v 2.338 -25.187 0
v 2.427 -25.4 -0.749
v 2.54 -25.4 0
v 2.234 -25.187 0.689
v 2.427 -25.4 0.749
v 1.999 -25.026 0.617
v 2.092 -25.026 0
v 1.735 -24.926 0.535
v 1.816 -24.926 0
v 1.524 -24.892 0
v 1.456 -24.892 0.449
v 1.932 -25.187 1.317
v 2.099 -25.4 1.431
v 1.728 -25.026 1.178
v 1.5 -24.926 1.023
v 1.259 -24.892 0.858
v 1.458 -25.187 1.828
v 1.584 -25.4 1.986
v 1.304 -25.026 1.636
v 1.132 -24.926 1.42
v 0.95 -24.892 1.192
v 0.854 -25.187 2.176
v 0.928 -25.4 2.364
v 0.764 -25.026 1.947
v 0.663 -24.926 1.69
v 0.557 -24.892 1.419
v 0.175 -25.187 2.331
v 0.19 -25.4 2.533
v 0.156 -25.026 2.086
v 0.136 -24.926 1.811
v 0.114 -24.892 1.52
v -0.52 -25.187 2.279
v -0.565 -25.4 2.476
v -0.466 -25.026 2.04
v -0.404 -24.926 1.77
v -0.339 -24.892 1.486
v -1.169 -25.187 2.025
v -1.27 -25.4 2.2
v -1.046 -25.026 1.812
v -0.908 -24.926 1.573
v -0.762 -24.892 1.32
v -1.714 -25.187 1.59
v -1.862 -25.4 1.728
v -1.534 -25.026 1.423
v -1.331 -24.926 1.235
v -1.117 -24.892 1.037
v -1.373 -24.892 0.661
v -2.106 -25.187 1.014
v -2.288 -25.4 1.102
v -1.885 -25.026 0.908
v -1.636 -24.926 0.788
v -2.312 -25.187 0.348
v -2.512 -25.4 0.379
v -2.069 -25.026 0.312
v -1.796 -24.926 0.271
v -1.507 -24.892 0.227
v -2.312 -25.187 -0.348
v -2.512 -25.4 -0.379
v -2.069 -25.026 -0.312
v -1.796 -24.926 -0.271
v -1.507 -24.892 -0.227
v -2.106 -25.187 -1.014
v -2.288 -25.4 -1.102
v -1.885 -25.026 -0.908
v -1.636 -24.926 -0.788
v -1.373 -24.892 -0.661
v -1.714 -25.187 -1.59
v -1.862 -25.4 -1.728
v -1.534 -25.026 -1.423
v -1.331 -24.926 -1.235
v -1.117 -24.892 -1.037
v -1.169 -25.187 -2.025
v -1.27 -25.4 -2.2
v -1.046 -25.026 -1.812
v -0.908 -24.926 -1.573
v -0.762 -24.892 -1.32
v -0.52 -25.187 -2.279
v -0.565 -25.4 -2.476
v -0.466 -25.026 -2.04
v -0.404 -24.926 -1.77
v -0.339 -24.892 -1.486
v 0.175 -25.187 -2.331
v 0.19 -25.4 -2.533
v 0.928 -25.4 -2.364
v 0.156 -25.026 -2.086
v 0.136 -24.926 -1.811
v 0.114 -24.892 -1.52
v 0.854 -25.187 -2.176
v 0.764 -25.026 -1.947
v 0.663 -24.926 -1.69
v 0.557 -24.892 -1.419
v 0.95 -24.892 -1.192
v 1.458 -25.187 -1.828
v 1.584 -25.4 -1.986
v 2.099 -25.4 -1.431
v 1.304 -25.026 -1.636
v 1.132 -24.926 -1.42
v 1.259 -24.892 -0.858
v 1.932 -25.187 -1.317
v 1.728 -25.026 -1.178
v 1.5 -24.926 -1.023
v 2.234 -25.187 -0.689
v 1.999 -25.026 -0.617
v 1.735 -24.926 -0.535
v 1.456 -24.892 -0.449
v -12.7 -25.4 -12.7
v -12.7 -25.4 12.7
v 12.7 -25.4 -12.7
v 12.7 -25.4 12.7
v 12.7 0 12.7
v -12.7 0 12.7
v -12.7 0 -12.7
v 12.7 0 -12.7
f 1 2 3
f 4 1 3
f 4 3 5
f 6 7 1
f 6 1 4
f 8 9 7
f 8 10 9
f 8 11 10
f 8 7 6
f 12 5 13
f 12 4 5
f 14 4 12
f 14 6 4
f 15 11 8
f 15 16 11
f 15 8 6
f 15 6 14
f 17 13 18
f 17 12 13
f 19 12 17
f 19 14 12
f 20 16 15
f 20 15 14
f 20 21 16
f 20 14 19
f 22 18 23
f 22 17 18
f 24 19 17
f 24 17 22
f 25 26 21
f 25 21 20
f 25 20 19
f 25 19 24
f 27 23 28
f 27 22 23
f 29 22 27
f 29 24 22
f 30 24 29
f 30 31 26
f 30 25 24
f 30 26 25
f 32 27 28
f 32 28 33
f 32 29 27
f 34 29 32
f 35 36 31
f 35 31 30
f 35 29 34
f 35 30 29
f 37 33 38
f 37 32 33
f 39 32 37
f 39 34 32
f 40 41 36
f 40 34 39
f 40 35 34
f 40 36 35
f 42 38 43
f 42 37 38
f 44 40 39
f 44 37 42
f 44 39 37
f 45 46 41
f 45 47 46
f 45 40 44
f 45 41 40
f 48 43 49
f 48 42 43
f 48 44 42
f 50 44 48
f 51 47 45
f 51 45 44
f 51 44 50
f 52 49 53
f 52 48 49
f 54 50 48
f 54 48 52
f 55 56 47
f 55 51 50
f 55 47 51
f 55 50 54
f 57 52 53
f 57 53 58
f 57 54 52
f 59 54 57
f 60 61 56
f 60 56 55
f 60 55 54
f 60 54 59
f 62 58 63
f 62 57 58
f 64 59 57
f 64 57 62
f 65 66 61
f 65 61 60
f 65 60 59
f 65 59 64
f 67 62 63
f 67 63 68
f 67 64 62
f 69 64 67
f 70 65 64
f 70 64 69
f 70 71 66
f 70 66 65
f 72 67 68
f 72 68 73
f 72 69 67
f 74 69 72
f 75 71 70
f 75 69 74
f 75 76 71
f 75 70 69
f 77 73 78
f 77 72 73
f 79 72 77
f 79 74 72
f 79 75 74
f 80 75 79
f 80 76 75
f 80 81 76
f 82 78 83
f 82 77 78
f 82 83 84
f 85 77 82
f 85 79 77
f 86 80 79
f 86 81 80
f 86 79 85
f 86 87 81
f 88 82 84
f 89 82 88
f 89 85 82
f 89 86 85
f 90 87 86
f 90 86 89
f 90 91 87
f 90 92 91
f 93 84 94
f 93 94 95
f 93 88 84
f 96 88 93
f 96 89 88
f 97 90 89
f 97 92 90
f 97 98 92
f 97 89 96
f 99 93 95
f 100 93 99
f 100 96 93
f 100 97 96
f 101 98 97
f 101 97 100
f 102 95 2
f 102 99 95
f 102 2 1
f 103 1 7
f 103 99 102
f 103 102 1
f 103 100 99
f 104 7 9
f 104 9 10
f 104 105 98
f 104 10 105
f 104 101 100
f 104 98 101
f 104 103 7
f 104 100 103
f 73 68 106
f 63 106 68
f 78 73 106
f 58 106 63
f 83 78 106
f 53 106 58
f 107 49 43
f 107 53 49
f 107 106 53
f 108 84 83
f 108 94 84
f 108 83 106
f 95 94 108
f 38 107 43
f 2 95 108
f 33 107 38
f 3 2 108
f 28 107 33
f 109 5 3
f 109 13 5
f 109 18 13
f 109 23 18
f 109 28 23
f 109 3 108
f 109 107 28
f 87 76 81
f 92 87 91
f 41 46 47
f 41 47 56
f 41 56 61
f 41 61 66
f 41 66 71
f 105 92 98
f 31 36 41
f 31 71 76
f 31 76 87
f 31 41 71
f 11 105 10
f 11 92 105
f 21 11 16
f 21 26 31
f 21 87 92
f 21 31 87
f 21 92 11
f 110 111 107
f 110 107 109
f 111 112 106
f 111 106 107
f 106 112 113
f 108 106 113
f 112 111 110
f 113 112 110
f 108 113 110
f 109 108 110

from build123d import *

# Parameters (mm, degrees)
F0_W     = 25.4
F0_H     = 25.4
F1_DEPTH = 25.4
F2_R     = 2.54
F3_DEPTH = 0.508


# Not quite as in the source:
# - a fillet or chamfer that OpenCascade refuses, or shapes differently, is made with other operations: its cross-section is extruded or revolved along the edge and cut away or added


with BuildPart() as f1:
    # F0 (on Front) → F1 (new body)
    with BuildSketch(Plane.XZ):
        Rectangle(F0_W, F0_H)
    extrude(amount=F1_DEPTH)

    # F2 (on face) → F3 (cut)
    with BuildSketch(Plane.XZ.offset(25.4)):
        Circle(F2_R)
    extrude(amount=-F3_DEPTH, mode=Mode.SUBTRACT)

    # F4: fillet of radius 1.27 on 1 edges, made by hand

    # F4_s1 → F4_t2 (revolve)
    with BuildSketch(Plane.XY):
        with BuildLine():
            ThreePointArc((2.54, -25.4), (2.0919612663, -25.0260774674), (1.524, -24.892))
            Line((1.524, -24.892), (2.54, -24.892))
            Line((2.54, -24.892), (2.54, -25.4))
        make_face()
    revolve(axis=Axis((0, -24.892, 0), (0, -1, 0)))


solid = f1.part
